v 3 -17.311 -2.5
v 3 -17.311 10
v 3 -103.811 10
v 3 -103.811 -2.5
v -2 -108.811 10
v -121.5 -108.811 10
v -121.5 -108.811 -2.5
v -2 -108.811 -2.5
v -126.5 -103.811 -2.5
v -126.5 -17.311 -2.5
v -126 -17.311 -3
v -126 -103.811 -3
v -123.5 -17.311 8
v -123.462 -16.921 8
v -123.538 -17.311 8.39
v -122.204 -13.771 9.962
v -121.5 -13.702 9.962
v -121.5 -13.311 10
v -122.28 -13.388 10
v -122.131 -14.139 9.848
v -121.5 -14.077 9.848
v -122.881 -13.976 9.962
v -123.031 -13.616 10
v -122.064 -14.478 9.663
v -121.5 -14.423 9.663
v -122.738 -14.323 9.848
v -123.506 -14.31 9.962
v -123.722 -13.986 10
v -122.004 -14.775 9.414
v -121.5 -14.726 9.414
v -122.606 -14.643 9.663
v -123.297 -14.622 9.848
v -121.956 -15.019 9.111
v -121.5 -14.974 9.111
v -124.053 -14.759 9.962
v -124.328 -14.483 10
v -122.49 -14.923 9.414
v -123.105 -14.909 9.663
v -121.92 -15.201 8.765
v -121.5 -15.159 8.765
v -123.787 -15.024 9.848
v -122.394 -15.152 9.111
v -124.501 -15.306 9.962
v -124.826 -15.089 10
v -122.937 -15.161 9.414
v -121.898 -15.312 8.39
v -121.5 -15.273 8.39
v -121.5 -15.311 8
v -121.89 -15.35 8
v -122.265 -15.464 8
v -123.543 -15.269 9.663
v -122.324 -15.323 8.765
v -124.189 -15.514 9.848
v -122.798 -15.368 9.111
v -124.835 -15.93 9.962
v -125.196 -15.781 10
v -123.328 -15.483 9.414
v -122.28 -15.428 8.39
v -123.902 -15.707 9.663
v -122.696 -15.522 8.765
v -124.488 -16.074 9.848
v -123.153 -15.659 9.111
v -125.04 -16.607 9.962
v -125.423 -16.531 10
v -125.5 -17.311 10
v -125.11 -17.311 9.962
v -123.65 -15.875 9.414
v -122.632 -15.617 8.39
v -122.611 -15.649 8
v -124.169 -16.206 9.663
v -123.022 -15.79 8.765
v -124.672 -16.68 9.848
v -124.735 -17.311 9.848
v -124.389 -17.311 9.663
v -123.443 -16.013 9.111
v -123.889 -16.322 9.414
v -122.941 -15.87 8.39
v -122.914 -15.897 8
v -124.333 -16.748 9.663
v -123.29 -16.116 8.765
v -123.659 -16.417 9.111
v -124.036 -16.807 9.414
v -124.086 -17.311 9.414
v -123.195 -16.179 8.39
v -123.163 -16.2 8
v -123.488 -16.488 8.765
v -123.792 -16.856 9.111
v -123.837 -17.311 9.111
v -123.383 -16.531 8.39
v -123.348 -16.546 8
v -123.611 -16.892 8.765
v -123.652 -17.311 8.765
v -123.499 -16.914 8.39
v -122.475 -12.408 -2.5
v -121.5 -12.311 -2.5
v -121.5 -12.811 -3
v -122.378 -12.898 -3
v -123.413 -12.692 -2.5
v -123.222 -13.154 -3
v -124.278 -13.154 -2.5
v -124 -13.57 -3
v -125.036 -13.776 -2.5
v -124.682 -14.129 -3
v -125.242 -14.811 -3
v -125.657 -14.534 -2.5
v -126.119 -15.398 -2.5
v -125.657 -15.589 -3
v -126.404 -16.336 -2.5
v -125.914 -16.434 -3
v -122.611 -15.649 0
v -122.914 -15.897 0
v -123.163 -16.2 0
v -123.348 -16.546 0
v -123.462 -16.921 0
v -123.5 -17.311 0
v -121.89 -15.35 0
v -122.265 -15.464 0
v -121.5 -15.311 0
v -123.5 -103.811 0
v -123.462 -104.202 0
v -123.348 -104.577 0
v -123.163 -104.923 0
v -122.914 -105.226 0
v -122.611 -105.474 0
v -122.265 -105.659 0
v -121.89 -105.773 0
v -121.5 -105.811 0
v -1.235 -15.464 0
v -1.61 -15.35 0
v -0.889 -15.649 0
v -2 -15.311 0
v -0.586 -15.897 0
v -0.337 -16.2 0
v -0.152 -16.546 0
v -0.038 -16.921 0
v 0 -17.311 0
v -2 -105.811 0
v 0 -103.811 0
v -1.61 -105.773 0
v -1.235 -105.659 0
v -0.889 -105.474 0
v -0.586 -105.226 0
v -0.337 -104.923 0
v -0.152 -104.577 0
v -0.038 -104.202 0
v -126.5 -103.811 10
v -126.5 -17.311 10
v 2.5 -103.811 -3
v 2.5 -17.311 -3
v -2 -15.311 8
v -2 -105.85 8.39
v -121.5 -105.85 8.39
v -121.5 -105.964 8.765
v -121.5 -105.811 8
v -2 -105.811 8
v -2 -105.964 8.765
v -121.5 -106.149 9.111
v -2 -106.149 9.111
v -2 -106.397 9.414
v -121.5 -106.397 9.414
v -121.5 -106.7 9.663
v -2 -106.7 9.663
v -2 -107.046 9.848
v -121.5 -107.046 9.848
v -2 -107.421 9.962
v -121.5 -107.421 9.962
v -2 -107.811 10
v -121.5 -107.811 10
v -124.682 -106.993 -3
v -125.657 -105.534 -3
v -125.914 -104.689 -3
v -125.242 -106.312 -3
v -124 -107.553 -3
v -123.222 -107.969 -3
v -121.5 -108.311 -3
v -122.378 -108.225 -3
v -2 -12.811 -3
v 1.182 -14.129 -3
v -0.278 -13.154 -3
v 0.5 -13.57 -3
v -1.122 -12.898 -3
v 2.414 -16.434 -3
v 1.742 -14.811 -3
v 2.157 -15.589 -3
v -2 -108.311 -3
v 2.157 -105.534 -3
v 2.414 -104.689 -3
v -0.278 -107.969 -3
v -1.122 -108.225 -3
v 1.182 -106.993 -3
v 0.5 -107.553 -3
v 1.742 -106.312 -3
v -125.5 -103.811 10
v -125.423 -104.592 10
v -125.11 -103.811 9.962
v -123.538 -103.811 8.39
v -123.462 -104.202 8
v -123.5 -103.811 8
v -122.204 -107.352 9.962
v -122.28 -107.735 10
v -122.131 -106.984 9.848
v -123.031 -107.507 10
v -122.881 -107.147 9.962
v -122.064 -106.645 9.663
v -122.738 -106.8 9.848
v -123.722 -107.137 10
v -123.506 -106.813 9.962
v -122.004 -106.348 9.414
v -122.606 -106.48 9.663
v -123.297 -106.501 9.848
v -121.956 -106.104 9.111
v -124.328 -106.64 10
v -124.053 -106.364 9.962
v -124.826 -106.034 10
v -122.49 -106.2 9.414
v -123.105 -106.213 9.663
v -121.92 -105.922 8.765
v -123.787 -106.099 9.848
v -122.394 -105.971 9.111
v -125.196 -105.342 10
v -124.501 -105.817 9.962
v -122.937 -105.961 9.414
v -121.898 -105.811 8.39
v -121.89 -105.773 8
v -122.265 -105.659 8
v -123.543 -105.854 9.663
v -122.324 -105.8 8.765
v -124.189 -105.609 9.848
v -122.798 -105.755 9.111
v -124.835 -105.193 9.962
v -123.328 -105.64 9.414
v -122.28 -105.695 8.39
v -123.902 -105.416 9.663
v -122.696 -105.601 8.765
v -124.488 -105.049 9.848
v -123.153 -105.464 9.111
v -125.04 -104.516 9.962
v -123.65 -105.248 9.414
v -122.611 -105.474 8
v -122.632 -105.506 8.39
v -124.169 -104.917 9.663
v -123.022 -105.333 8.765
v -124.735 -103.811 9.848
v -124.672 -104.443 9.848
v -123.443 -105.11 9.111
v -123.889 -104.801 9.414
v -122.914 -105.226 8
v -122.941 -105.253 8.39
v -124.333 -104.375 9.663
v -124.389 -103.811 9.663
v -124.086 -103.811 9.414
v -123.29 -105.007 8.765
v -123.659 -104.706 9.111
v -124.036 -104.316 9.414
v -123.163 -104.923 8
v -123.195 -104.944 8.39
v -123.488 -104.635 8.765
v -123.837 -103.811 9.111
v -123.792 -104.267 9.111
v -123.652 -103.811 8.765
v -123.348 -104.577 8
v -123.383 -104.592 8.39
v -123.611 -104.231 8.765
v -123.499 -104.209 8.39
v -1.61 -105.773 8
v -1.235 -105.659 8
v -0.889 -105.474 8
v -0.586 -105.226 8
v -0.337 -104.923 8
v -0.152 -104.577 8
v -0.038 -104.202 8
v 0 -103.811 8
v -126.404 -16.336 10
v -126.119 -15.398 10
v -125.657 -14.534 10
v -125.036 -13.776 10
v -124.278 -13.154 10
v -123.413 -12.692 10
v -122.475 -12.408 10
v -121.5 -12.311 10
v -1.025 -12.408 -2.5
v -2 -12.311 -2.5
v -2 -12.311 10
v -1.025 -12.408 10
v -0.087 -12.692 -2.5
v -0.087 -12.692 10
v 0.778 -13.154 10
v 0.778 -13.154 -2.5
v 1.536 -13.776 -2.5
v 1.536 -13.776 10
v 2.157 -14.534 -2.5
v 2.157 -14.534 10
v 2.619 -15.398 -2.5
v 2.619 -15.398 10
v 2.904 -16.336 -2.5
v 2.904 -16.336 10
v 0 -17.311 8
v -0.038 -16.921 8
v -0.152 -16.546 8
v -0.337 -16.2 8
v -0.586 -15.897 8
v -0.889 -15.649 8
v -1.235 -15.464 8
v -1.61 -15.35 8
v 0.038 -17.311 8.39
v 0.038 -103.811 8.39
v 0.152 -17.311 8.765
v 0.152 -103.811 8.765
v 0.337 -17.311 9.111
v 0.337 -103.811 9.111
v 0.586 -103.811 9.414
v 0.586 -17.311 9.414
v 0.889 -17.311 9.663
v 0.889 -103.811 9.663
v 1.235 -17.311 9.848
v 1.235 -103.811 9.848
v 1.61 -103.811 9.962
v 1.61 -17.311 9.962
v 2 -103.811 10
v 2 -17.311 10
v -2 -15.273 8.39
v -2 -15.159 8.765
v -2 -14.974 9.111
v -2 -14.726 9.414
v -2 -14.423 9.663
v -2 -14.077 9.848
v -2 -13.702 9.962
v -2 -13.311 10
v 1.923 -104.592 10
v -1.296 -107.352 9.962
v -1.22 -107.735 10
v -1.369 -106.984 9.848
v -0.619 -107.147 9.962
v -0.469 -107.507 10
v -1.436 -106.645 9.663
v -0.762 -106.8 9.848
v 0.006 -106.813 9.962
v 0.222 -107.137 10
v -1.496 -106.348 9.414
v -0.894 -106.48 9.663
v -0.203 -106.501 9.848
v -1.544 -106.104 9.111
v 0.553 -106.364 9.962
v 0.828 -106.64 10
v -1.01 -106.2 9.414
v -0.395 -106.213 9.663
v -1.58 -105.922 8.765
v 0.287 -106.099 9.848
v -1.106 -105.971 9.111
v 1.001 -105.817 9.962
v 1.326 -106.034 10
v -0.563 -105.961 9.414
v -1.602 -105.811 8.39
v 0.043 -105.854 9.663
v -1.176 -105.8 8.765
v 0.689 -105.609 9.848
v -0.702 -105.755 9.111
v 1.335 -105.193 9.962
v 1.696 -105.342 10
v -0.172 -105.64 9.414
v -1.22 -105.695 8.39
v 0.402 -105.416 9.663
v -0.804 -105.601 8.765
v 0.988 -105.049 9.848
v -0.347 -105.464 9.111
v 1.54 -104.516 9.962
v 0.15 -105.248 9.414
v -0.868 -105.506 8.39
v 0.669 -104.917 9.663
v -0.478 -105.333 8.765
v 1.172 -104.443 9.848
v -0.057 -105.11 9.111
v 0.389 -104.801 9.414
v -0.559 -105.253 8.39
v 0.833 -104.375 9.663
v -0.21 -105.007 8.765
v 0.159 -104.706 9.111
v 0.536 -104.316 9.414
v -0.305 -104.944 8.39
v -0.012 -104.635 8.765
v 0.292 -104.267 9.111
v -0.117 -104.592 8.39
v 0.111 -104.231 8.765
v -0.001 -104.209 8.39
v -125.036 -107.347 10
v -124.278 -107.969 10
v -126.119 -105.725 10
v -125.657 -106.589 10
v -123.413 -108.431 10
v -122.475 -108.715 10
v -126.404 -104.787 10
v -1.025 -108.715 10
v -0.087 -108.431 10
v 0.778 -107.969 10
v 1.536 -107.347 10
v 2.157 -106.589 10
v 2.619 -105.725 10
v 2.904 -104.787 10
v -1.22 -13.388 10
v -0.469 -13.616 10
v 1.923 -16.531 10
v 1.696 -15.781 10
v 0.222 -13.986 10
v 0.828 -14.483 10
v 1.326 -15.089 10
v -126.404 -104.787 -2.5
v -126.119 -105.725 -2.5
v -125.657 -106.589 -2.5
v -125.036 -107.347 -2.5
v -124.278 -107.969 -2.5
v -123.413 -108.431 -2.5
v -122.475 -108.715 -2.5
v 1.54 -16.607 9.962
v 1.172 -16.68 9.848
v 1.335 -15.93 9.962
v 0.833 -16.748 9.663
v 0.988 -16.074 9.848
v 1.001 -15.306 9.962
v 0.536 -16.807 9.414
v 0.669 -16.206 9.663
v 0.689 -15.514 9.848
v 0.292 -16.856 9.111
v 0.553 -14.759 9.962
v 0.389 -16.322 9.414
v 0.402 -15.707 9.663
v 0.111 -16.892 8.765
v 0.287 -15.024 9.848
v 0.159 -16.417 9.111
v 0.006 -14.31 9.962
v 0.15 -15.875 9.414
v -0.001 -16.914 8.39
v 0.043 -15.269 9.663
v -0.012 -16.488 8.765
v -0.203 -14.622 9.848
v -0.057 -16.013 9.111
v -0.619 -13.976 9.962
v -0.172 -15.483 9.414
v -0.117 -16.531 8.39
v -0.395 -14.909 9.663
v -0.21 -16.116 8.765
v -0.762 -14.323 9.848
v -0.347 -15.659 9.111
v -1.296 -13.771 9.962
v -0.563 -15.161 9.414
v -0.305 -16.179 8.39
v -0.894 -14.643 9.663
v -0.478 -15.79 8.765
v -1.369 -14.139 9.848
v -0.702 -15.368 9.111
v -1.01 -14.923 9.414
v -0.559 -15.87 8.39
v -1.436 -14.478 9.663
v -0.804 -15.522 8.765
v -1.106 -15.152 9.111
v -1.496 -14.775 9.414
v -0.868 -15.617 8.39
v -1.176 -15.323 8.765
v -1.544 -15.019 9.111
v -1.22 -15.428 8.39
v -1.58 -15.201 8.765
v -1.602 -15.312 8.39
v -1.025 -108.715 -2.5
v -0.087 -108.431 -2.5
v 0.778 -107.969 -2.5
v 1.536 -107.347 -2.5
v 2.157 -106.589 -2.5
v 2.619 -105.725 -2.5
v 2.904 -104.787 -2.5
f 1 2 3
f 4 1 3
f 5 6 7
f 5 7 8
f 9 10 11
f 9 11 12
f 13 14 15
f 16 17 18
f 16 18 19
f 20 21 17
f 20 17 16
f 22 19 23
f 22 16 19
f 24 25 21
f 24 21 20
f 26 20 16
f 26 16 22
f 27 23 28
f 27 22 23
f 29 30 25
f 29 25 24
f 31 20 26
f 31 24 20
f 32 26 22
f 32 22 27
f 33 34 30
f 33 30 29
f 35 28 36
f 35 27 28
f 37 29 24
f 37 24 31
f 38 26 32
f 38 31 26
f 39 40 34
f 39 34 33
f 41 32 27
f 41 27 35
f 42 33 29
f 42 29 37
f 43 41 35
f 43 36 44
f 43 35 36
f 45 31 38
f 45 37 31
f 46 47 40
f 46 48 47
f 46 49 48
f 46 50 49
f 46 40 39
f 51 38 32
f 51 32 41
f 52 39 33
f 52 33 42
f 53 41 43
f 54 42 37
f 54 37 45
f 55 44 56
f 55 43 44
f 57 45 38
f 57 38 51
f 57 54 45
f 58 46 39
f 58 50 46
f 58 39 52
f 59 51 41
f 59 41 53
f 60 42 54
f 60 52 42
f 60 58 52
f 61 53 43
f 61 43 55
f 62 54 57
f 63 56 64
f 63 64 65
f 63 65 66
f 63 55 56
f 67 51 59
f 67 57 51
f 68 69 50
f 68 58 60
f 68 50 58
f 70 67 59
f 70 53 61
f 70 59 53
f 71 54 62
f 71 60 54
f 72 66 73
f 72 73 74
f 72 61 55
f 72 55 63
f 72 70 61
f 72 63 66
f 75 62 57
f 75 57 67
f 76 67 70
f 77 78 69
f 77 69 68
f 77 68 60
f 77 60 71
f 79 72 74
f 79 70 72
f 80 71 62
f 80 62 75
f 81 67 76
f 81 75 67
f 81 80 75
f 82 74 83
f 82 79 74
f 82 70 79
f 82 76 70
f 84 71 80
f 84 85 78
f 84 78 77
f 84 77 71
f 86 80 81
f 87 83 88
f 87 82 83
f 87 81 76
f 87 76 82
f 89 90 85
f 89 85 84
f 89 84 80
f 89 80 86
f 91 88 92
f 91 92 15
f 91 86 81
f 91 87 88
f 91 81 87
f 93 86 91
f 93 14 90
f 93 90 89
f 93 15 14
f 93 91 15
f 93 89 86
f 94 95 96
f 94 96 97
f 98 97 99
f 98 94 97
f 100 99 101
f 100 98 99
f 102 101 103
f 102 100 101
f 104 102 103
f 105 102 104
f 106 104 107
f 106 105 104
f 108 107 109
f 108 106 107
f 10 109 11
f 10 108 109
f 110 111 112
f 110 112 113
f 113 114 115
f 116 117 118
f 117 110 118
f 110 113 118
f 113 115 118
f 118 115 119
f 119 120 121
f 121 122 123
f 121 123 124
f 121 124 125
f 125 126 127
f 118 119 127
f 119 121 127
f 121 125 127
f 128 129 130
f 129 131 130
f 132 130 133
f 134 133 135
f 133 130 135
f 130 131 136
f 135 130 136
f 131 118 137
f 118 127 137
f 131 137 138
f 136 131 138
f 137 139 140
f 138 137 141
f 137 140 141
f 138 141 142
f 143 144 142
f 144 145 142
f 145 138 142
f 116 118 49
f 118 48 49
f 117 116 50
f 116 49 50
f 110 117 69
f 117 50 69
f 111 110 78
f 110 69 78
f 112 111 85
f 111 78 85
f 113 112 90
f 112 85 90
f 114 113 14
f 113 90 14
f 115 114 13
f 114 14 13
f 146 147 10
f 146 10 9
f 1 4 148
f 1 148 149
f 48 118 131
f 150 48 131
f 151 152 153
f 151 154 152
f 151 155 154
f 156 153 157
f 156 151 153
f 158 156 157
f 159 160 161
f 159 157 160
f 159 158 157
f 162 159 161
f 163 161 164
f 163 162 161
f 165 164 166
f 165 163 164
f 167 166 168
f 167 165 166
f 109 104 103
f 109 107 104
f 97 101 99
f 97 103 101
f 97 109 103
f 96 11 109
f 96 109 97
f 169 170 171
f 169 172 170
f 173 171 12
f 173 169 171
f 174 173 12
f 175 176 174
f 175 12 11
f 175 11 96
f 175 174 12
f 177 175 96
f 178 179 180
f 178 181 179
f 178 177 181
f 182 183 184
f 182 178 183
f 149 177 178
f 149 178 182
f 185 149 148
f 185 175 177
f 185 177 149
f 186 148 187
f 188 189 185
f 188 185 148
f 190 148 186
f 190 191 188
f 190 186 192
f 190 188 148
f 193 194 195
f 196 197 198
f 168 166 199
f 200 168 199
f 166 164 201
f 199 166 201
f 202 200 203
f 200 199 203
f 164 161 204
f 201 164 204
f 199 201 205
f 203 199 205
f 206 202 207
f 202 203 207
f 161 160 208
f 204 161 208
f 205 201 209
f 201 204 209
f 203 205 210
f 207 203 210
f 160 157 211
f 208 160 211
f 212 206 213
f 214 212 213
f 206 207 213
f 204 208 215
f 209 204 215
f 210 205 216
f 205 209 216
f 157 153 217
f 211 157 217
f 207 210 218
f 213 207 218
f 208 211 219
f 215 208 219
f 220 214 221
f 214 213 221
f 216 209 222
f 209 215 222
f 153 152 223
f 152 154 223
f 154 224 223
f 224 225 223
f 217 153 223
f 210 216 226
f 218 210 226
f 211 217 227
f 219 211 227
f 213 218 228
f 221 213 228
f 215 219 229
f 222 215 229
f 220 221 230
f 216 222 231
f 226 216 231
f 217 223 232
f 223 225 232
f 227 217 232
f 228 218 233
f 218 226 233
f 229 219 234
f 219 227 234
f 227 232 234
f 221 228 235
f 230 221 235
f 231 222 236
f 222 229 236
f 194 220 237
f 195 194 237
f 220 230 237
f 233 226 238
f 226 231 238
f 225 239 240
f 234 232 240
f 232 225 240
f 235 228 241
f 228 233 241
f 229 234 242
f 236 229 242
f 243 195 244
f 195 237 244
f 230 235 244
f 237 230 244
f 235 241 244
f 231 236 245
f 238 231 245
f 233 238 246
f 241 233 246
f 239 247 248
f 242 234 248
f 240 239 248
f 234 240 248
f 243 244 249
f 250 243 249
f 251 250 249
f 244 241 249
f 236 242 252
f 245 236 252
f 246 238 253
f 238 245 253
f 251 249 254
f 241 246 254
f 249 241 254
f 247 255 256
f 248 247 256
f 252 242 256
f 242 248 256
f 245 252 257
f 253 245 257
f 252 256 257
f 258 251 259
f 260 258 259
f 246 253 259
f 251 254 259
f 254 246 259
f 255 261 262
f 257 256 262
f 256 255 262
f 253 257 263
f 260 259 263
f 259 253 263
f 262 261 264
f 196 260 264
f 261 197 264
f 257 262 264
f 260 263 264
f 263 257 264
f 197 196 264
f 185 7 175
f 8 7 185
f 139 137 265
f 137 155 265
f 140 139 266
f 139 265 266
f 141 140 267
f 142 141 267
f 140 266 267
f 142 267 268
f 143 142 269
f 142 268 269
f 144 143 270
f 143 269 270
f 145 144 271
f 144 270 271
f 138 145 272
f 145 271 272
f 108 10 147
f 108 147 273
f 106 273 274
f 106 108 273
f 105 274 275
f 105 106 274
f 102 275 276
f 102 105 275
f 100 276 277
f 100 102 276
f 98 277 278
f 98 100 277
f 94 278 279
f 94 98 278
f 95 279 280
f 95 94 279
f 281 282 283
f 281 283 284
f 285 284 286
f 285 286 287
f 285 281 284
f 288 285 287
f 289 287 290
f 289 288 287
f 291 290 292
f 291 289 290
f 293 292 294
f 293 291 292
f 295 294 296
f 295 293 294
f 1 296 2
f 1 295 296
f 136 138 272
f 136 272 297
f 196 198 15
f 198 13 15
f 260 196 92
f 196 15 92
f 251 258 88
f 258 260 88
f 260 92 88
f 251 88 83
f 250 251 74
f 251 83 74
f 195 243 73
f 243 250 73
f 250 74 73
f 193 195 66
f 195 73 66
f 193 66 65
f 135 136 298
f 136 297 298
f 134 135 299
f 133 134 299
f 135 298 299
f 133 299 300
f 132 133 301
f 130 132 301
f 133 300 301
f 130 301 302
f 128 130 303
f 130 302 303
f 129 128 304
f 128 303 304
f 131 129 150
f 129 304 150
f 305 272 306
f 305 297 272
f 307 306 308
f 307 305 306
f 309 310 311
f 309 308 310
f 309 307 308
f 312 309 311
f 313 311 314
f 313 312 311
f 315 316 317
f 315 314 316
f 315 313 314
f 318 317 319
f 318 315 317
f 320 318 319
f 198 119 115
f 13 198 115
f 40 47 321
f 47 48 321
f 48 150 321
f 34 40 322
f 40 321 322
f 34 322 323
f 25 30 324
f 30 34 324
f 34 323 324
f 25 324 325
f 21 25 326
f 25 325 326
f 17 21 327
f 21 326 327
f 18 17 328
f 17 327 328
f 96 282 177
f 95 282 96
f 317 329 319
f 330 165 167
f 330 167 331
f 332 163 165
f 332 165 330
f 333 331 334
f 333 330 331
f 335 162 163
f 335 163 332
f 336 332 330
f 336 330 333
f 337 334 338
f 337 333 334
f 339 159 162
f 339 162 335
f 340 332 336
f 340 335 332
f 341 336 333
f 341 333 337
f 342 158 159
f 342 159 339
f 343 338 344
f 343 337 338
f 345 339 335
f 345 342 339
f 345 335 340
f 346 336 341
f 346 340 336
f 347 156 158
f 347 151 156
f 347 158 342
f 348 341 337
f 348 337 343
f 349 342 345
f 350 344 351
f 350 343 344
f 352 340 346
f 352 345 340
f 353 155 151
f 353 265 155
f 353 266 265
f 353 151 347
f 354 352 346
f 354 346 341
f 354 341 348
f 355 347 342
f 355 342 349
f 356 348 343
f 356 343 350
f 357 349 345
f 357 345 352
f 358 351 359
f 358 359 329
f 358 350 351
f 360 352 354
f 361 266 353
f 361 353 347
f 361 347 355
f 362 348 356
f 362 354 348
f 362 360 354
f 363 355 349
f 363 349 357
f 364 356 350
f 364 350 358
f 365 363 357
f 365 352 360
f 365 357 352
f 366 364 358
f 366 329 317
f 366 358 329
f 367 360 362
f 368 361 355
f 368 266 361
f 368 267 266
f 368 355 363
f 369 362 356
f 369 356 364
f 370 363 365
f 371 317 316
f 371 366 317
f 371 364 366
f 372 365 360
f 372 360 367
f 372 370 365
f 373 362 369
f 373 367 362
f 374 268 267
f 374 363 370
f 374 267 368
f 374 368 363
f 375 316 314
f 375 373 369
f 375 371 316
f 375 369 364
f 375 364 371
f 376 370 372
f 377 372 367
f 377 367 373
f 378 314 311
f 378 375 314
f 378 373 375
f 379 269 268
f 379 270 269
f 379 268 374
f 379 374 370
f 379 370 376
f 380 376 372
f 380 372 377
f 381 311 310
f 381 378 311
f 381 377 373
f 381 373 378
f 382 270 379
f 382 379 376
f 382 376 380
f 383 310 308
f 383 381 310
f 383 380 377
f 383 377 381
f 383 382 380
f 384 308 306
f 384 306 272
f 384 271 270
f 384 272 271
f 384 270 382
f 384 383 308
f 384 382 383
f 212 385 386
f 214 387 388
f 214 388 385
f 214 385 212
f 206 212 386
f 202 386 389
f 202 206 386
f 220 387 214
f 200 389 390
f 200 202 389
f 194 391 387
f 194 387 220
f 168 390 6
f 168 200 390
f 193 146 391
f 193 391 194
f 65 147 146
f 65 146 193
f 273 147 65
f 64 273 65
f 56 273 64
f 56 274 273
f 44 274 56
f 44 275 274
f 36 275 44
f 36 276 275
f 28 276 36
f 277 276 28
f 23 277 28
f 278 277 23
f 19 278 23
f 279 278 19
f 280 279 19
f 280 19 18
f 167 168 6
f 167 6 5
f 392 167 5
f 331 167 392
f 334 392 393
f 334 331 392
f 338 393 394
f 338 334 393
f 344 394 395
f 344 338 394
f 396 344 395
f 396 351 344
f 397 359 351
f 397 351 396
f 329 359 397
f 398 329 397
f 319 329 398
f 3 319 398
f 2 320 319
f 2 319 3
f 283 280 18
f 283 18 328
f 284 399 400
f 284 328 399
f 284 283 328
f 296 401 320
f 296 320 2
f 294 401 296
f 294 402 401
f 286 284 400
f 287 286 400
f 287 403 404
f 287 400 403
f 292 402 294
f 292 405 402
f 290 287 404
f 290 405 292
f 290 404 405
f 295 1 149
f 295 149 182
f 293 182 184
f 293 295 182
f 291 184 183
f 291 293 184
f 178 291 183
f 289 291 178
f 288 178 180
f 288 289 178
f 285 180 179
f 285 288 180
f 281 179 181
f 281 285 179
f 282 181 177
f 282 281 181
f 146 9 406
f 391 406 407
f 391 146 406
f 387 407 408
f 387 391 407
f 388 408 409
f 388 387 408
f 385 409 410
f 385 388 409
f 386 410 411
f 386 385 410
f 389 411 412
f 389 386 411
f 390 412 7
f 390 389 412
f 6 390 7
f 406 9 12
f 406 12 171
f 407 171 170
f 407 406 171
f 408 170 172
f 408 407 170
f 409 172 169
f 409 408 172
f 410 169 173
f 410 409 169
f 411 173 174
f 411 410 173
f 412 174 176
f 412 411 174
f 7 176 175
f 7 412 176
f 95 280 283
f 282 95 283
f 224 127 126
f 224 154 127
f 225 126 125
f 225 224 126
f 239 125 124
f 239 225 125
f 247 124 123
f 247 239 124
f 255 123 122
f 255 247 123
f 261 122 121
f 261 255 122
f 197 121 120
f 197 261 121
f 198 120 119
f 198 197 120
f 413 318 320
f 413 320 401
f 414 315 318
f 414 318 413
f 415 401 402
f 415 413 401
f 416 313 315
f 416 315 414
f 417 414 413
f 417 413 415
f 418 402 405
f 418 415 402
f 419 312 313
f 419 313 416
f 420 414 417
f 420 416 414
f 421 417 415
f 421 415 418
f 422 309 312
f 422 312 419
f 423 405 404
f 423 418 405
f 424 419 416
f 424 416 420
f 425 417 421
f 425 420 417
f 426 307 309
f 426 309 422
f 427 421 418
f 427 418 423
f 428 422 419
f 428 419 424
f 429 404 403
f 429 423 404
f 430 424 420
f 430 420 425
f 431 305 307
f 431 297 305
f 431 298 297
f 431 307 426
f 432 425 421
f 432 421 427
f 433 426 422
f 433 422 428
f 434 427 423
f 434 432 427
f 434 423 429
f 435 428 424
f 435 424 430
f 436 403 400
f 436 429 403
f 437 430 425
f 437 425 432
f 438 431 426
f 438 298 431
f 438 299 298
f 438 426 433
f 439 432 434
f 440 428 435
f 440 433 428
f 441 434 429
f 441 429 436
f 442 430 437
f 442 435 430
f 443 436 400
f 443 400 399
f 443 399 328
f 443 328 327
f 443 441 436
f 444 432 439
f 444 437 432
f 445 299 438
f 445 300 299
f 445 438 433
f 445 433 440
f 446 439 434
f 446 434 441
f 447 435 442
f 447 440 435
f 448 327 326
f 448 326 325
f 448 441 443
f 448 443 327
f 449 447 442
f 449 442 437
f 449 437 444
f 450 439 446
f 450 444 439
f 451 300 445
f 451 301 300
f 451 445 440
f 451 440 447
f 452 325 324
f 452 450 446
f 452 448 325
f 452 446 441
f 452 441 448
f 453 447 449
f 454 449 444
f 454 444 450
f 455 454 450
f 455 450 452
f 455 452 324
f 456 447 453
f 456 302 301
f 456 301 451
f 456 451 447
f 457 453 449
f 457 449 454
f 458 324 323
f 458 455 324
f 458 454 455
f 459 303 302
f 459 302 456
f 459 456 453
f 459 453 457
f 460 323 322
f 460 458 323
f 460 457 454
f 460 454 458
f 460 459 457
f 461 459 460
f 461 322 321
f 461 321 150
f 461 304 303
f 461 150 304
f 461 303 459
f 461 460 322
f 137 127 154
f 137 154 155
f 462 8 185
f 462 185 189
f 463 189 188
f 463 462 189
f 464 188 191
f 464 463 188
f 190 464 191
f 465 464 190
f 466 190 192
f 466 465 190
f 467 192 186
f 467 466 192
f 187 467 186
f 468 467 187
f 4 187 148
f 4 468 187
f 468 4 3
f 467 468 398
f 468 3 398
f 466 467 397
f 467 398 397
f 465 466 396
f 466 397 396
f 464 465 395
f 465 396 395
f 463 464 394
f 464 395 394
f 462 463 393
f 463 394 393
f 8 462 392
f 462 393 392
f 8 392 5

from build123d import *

# Parameters (mm, degrees)
F0_W     = 129.5
F0_H     = 96.5
F0_W_2   = 123.5
F0_H_2   = 90.5
F1_DEPTH = 10
F2_R     = 2
F3_W     = 129.5
F3_H     = 96.5
F4_DEPTH = 3
F5_R     = 5
F6_SIZE  = 0.5


with BuildPart() as f1:
    # F0 (on Top) → F1 (new body)
    with BuildSketch(Plane.XY):
        with Locations((-61.75, -60.5614758432)):
            Rectangle(F0_W, F0_H)
        with Locations((-61.75, -60.5614758432)):
            Rectangle(F0_W_2, F0_H_2, mode=Mode.SUBTRACT)
    extrude(amount=F1_DEPTH)

    # F2
    f2_edges = [f1.edges().sort_by_distance(p)[0] for p in [
        (-123.5, -105.811476, 5),
        (-61.75, -105.811476, 10),
        (-61.75, -15.311476, 10),
        (-123.5, -60.561476, 10),
        (0, -15.311476, 5),
        (0, -60.561476, 10),
        (0, -105.811476, 5),
        (-123.5, -15.311476, 5),
    ]]
    fillet(f2_edges, radius=F2_R)

    # F3 (on face) → F4 (join)
    with BuildSketch(Plane(origin=(0, 0, 0), x_dir=(1, 0, 0), z_dir=(0, 0, -1))):
        with Locations((-61.75, 60.5614758432)):
            Rectangle(F3_W, F3_H)
    extrude(amount=F4_DEPTH)

    # F5
    f5_edges = [f1.edges().sort_by_distance(p)[0] for p in [
        (-126.5, -108.811476, 3.5),
        (3, -108.811476, 3.5),
        (3, -12.311476, 3.5),
        (-126.5, -12.311476, 3.5),
    ]]
    fillet(f5_edges, radius=F5_R)

    # F6
    f6_edges = [f1.edges().sort_by_distance(p)[0] for p in [
        (-125.035534, -107.34701, -3),
        (-61.75, -108.811476, -3),
        (-126.5, -60.561476, -3),
        (1.535534, -107.34701, -3),
        (3, -60.561476, -3),
        (-125.035534, -13.775942, -3),
        (-61.75, -12.311476, -3),
        (1.535534, -13.775942, -3),
    ]]
    chamfer(f6_edges, length=F6_SIZE)


solid = f1.part
